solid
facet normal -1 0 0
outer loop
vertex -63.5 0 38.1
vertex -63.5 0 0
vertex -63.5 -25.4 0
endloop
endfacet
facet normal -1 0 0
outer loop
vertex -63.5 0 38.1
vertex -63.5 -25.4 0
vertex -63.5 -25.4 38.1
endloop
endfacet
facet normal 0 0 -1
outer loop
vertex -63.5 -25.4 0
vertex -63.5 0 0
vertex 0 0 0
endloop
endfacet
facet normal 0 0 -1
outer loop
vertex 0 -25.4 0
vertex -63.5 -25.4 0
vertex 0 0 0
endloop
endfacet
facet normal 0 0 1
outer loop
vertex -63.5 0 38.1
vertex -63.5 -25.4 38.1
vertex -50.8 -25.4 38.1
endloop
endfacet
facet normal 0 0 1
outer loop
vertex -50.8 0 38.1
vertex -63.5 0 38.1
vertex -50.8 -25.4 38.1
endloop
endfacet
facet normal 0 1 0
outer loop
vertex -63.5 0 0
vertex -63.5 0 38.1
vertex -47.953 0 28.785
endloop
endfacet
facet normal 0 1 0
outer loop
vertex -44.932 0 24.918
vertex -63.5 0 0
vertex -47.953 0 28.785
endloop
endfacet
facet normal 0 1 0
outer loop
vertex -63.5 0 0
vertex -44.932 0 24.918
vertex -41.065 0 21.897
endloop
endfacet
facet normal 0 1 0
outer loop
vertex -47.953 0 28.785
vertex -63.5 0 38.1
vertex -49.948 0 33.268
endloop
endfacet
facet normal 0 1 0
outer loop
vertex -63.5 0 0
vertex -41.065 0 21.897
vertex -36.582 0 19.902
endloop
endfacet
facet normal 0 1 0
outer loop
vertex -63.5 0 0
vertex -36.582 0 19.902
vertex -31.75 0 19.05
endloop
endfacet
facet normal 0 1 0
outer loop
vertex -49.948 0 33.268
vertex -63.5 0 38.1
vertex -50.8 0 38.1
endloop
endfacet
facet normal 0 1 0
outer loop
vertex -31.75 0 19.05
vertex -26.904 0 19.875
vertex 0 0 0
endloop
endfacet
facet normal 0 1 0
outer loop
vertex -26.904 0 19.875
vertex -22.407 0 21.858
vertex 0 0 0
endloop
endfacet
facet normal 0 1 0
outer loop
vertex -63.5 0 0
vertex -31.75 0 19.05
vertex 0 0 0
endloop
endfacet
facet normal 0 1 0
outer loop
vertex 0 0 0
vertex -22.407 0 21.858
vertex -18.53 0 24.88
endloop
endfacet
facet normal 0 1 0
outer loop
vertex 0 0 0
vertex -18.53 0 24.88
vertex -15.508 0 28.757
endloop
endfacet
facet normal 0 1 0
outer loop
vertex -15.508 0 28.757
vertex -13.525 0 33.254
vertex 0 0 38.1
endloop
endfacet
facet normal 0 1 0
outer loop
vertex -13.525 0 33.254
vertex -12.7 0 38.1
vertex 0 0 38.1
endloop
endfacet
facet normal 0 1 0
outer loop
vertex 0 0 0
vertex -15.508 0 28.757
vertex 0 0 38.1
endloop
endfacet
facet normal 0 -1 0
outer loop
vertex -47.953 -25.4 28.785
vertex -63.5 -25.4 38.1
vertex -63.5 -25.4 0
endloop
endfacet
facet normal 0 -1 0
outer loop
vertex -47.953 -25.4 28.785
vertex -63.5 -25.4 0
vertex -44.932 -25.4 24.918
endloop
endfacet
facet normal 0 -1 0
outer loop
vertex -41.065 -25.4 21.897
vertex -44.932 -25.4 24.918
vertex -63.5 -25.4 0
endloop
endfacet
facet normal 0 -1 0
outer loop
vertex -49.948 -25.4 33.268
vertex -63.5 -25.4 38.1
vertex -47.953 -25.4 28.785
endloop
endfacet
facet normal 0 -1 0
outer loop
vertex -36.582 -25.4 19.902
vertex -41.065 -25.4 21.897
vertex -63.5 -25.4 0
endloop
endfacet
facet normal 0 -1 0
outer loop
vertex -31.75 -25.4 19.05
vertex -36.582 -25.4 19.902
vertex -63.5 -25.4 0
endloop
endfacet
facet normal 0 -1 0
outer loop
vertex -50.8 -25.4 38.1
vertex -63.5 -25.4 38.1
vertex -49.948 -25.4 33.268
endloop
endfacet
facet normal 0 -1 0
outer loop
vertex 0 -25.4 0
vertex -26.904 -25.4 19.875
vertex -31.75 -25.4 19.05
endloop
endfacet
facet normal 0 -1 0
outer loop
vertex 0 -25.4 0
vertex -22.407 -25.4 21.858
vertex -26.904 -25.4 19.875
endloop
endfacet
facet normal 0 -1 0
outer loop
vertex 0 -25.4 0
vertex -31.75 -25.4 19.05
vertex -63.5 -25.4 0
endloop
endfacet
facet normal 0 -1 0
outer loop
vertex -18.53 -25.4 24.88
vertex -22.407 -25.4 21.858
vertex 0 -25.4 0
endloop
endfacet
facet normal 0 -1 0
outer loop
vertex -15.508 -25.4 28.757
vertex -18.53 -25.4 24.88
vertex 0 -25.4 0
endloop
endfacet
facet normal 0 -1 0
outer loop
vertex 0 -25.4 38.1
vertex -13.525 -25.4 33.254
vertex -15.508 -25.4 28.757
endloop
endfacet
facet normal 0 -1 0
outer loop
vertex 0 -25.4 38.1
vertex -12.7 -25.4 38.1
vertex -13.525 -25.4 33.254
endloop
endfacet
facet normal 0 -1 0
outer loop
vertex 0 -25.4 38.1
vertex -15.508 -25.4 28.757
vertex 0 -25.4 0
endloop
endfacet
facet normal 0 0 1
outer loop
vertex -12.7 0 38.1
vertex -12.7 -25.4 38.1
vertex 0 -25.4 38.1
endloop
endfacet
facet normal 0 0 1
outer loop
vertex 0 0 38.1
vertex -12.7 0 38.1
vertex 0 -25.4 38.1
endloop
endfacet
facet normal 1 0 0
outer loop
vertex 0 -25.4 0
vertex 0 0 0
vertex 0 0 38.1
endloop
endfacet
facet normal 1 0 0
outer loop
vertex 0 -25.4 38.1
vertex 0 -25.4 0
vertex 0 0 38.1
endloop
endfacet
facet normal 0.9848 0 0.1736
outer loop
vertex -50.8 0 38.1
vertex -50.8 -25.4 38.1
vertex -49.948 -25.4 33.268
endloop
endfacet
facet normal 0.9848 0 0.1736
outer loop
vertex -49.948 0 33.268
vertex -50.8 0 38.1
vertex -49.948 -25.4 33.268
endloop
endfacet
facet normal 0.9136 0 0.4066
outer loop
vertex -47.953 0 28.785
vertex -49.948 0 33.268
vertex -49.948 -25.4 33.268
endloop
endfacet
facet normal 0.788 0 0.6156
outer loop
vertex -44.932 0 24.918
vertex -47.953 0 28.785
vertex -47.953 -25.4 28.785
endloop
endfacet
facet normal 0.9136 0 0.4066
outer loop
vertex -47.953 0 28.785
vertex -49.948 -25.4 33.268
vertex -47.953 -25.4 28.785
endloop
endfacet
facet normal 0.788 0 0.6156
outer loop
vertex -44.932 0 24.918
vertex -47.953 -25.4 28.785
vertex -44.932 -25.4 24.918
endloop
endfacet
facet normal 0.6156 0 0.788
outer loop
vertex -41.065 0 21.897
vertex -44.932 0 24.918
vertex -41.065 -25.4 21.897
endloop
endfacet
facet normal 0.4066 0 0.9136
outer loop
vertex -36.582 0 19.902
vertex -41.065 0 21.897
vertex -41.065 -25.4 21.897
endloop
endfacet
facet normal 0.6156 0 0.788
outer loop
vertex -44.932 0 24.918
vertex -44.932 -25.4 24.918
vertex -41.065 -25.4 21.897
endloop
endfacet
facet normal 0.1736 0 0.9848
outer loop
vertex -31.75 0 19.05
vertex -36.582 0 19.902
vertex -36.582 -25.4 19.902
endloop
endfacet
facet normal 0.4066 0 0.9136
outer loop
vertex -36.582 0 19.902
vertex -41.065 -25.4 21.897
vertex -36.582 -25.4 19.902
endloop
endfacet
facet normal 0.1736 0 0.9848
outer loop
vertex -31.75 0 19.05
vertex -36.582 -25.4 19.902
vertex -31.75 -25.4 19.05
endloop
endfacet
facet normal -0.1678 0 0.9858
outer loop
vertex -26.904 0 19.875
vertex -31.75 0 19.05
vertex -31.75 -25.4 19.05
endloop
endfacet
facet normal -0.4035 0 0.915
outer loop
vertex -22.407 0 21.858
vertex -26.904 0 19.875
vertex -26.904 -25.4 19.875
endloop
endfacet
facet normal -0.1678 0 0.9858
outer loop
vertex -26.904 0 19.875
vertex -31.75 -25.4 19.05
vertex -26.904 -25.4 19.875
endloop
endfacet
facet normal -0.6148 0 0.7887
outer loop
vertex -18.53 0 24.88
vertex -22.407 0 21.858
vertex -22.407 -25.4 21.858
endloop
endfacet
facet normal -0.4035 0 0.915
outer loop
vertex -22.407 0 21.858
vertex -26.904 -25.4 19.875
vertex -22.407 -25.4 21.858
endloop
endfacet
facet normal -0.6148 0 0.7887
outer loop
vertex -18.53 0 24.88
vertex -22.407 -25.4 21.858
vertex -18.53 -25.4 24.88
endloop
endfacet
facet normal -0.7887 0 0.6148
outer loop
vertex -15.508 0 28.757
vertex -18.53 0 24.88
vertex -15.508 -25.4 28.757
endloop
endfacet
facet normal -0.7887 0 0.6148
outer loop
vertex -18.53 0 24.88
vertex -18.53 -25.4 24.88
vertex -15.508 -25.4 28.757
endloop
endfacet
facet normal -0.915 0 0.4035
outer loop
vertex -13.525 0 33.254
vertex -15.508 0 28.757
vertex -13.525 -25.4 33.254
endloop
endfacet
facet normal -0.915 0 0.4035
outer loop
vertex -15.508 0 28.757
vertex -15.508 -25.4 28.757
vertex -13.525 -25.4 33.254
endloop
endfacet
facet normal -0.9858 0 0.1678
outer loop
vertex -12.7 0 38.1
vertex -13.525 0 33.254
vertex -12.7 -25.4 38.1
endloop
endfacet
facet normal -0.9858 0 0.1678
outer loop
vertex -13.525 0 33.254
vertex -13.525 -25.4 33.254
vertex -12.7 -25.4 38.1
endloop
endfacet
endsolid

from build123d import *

# Parameters (mm, degrees)
F0_W     = 63.5
F0_H     = 38.1
F1_DEPTH = 25.4
F3_DEPTH = 25.4


with BuildPart() as f1:
    # F0 (on Front) → F1 (new body)
    with BuildSketch(Plane.XZ):
        with Locations((-31.75, 19.05)):
            Rectangle(F0_W, F0_H)
    extrude(amount=F1_DEPTH)

    # F2 (on face) → F3 (cut)
    with BuildSketch(Plane.XZ.offset(25.4)):
        with BuildLine():
            ThreePointArc((-50.8, 38.1), (-44.931719, 24.918281), (-31.75, 19.05))
            ThreePointArc((-31.75, 19.05), (-18.530061, 24.880061), (-12.7, 38.1))
            Line((-12.7, 38.1), (-31.75, 38.1))
            Line((-31.75, 38.1), (-50.8, 38.1))
        make_face()
    extrude(amount=-F3_DEPTH, mode=Mode.SUBTRACT)


solid = f1.part
